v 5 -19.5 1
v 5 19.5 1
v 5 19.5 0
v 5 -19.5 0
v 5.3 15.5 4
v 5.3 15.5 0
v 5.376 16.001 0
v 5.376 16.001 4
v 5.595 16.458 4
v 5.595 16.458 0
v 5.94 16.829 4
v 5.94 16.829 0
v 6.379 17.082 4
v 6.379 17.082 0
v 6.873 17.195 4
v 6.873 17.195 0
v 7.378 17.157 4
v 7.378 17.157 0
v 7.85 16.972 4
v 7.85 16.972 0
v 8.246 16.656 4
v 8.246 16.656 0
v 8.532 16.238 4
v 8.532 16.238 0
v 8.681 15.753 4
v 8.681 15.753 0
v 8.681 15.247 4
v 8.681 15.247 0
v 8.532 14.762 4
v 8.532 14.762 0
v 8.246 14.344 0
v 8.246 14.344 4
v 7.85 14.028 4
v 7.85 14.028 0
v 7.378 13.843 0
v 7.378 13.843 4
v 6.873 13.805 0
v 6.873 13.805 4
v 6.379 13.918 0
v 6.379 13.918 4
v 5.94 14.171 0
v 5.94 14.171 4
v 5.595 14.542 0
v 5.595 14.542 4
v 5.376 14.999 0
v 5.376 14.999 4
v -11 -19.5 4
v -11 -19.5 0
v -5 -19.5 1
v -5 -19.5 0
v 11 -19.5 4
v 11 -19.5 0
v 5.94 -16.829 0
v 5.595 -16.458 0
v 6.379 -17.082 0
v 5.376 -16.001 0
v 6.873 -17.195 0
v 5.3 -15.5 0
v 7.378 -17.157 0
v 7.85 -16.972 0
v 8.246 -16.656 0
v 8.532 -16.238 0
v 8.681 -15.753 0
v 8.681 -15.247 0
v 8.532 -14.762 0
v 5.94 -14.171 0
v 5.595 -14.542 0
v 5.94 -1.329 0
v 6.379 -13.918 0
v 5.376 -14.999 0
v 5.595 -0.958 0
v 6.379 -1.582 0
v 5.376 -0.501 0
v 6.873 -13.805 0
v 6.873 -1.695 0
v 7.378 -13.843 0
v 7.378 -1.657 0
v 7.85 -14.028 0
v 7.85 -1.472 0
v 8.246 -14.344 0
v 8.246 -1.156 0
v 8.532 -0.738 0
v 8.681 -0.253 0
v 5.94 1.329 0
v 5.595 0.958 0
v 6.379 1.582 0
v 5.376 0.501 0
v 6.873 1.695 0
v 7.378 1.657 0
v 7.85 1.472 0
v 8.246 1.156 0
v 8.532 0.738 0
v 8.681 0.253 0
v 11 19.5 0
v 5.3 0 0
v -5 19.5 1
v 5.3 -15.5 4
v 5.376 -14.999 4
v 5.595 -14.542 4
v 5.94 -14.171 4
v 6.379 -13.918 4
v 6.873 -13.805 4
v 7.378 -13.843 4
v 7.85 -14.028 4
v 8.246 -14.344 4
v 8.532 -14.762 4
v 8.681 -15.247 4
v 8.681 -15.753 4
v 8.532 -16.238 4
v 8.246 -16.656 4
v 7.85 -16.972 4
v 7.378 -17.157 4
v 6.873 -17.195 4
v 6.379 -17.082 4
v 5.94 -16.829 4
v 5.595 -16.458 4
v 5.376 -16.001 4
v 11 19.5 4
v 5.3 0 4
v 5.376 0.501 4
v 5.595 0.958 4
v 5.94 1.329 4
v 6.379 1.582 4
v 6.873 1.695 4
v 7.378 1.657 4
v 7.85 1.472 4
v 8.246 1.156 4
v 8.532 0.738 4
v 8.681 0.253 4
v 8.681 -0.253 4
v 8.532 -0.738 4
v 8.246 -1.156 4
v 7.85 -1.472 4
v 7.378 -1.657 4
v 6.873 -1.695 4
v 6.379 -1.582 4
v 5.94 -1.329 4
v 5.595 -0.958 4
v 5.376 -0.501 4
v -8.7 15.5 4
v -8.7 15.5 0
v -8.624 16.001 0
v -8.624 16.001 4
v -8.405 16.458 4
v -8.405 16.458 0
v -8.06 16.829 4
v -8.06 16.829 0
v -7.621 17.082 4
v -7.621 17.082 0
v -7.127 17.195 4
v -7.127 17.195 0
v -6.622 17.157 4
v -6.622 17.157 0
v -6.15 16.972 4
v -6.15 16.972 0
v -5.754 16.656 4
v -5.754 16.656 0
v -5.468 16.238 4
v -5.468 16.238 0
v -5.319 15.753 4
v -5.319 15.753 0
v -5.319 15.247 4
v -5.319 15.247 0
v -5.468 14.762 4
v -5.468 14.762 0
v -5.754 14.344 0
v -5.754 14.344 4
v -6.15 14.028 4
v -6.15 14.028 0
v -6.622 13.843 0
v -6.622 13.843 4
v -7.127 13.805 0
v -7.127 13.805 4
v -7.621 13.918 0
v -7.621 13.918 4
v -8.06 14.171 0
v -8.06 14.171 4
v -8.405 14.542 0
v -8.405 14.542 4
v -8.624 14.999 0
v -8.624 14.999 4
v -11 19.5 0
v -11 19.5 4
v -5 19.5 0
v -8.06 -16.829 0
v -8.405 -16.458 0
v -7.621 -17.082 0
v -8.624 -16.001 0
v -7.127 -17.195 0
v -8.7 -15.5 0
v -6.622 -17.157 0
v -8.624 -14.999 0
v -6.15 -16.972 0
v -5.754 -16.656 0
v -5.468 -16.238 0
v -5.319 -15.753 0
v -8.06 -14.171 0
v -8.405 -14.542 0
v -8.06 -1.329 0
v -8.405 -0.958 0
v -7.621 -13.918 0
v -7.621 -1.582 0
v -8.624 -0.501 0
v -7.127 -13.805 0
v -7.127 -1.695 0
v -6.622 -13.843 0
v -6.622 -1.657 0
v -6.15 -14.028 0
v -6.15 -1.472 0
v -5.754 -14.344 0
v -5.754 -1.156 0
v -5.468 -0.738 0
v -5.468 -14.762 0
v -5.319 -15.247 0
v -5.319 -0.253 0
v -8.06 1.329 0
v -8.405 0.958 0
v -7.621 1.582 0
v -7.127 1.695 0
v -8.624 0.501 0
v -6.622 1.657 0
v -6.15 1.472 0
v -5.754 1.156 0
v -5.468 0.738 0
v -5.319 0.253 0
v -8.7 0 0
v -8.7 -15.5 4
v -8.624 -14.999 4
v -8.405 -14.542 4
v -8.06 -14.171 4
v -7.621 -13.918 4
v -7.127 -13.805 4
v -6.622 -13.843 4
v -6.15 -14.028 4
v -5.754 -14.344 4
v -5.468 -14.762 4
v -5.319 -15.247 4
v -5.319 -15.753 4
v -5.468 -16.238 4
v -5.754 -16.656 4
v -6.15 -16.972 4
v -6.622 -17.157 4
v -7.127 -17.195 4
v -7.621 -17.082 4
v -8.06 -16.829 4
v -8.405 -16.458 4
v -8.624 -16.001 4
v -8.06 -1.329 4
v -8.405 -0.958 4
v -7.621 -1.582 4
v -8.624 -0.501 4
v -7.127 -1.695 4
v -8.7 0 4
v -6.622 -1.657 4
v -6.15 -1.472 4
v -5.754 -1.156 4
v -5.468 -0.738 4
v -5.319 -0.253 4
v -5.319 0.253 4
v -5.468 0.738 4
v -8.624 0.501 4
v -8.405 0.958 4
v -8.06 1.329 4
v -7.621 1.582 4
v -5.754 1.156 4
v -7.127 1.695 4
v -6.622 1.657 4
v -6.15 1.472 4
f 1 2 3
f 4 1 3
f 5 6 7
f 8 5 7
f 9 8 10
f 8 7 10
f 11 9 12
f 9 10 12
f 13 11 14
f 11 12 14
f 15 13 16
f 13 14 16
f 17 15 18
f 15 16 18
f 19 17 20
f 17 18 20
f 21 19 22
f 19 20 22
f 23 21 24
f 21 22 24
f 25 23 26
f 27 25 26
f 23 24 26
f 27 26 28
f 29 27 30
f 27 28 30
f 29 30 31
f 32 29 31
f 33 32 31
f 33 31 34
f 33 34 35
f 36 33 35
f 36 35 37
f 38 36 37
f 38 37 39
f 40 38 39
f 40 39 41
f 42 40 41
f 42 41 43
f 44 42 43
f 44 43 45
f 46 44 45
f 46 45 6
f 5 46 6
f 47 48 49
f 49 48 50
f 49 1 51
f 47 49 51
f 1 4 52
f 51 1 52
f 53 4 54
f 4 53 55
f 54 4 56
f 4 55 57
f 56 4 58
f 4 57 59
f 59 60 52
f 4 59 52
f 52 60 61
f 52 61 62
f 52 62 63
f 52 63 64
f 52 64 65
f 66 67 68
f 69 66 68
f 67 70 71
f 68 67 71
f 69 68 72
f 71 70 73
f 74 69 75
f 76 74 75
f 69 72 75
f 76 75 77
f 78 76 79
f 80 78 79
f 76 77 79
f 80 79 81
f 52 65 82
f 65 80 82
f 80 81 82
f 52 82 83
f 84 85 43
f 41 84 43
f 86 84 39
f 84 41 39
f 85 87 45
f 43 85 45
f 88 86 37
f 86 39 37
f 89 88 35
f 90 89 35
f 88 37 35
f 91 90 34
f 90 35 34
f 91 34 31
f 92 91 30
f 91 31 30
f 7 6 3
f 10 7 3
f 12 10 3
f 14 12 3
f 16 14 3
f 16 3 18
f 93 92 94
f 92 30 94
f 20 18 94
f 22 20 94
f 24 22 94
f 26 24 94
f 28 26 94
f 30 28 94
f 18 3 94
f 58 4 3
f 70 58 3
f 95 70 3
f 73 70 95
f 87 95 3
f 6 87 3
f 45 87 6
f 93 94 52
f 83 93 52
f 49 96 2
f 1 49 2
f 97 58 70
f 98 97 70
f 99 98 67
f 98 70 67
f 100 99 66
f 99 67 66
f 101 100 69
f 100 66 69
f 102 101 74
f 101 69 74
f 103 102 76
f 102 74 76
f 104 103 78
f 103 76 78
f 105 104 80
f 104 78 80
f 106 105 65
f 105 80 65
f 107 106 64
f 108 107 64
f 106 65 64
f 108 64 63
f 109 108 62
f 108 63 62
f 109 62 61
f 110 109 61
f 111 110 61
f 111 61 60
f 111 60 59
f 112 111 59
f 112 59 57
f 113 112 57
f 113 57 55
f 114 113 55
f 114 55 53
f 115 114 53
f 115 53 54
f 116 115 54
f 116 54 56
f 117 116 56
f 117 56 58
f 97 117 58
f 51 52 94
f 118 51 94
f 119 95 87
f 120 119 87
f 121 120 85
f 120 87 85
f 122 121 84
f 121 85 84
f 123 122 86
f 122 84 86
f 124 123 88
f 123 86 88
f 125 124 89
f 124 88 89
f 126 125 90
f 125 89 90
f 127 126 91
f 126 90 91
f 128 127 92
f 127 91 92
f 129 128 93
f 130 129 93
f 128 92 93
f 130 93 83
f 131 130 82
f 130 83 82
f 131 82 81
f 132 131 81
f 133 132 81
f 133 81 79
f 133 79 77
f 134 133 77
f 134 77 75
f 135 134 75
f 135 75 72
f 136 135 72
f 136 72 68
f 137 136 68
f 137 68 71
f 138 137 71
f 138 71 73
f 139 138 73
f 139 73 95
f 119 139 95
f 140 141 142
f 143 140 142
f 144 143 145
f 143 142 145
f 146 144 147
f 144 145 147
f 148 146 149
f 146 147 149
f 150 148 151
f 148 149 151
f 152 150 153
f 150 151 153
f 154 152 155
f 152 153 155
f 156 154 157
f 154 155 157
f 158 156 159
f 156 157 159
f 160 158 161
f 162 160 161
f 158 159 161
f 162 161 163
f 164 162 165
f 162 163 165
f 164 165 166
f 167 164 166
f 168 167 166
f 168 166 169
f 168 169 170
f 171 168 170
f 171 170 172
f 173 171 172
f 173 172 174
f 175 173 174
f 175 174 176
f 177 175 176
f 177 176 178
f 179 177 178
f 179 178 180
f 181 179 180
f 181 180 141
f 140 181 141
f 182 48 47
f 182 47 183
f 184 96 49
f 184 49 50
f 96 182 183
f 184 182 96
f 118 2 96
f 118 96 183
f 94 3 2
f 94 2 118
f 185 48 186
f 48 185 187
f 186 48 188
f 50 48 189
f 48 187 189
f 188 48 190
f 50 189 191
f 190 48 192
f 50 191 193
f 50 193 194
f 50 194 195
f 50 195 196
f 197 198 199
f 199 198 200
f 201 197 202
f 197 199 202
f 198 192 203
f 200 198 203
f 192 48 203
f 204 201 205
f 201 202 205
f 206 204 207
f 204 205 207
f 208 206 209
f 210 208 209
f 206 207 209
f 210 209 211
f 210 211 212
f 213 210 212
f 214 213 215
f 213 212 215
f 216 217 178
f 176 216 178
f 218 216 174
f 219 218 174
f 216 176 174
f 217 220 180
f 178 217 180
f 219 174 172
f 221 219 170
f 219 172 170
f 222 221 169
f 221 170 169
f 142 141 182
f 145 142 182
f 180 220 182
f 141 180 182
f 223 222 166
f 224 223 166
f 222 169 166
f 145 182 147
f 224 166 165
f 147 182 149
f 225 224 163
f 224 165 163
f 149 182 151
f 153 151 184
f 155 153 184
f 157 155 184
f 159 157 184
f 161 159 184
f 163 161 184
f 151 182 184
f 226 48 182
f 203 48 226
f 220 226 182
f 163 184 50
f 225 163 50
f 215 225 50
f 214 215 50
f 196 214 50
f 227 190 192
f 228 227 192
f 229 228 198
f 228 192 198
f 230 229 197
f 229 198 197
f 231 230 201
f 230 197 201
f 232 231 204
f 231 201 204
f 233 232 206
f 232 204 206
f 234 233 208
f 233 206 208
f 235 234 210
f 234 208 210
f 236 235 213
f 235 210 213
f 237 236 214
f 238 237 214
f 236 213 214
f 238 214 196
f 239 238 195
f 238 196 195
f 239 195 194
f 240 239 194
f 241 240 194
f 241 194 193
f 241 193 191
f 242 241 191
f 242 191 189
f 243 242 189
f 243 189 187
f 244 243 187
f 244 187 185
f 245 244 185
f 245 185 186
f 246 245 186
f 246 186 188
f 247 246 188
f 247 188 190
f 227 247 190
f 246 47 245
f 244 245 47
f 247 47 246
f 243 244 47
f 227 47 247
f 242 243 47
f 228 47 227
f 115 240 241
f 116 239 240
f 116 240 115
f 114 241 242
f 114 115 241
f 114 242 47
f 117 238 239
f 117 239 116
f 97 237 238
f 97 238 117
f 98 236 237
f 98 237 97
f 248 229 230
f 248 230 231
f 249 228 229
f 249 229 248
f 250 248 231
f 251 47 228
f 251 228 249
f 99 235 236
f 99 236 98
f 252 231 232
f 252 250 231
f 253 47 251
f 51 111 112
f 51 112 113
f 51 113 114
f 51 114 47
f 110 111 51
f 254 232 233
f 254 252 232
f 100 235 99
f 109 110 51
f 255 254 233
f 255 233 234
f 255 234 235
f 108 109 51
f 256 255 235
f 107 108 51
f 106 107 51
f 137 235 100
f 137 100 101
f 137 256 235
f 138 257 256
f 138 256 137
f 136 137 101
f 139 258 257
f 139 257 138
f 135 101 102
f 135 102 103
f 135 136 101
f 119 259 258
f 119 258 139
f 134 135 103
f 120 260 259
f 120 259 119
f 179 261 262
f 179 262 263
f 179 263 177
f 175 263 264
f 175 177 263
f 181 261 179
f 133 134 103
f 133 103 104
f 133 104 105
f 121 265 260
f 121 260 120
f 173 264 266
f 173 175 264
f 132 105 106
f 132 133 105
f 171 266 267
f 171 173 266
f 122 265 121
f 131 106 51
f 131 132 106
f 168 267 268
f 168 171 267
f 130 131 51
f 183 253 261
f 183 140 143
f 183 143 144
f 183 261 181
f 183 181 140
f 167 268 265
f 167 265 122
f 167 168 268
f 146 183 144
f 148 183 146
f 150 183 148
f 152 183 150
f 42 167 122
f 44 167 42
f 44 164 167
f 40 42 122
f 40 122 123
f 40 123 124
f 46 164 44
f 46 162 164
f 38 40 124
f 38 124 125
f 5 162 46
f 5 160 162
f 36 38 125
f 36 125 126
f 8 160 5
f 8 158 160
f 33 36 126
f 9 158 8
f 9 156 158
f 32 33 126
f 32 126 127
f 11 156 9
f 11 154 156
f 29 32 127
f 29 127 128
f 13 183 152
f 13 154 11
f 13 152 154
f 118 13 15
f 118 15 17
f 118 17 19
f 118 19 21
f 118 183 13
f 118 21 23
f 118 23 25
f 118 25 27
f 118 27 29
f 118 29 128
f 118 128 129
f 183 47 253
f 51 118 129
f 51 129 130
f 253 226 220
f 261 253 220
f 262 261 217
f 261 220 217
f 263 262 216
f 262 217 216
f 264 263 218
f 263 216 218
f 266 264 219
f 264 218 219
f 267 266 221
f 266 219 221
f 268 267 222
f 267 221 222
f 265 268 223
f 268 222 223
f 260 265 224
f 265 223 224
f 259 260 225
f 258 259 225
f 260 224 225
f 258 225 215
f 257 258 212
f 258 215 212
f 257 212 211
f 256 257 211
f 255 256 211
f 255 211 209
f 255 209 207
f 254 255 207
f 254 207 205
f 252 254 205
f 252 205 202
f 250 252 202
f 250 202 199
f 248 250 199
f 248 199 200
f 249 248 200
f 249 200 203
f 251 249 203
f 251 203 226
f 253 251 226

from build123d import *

# Parameters (mm, degrees)
SKETCH_1_W                  = 22
SKETCH_1_H                  = 39
EXTRUDE_1_DEPTH             = 4
SKETCH_2_W                  = 10
SKETCH_2_H                  = 1
CUT_EXTRUDE_1_DEPTH         = 40
SKETCH_3_R                  = 1.7
CUT_EXTRUDE_2_DEPTH         = 5
PATTERN_LINEAR_1_COUNT      = 2
PATTERN_LINEAR_1_PITCH      = 14
PATTERN_LINEAR_1_COUNT_DIR2 = 3
PATTERN_LINEAR_1_PITCH_DIR2 = 15.5


with BuildPart() as part:
    # 草圖1 → 填料-伸長1 (new body)
    with BuildSketch(Plane.XY):
        Rectangle(SKETCH_1_W, SKETCH_1_H)
    extrude(amount=EXTRUDE_1_DEPTH)

    # 草圖2 → 除料-伸長1 (cut, through all)
    with BuildSketch(Plane(origin=(0, 19.5, 0), x_dir=(1, 0, 0), z_dir=(0, 1, 0))):
        with Locations((0, -0.5)):
            Rectangle(SKETCH_2_W, SKETCH_2_H)
    extrude(amount=-CUT_EXTRUDE_1_DEPTH, mode=Mode.SUBTRACT)

    # 草圖3 → 除料-伸長2 (cut, through all)
    with BuildSketch(Plane(origin=(0, 0, 0), x_dir=(-1, 0, 0), z_dir=(0, 0, -1))):
        with Locations((-7, 15.5)):
            Circle(SKETCH_3_R)
    cut_extrude_2 = extrude(amount=-CUT_EXTRUDE_2_DEPTH, mode=Mode.SUBTRACT)

    # 直線複製排列1: Cut-Extrude 2 2 × 3
    with Locations(*[(-i * PATTERN_LINEAR_1_PITCH, -j * PATTERN_LINEAR_1_PITCH_DIR2, 0) for i in range(PATTERN_LINEAR_1_COUNT) for j in range(PATTERN_LINEAR_1_COUNT_DIR2) if (i, j) != (0, 0)]):
        add(cut_extrude_2, mode=Mode.SUBTRACT)


solid = part.part
